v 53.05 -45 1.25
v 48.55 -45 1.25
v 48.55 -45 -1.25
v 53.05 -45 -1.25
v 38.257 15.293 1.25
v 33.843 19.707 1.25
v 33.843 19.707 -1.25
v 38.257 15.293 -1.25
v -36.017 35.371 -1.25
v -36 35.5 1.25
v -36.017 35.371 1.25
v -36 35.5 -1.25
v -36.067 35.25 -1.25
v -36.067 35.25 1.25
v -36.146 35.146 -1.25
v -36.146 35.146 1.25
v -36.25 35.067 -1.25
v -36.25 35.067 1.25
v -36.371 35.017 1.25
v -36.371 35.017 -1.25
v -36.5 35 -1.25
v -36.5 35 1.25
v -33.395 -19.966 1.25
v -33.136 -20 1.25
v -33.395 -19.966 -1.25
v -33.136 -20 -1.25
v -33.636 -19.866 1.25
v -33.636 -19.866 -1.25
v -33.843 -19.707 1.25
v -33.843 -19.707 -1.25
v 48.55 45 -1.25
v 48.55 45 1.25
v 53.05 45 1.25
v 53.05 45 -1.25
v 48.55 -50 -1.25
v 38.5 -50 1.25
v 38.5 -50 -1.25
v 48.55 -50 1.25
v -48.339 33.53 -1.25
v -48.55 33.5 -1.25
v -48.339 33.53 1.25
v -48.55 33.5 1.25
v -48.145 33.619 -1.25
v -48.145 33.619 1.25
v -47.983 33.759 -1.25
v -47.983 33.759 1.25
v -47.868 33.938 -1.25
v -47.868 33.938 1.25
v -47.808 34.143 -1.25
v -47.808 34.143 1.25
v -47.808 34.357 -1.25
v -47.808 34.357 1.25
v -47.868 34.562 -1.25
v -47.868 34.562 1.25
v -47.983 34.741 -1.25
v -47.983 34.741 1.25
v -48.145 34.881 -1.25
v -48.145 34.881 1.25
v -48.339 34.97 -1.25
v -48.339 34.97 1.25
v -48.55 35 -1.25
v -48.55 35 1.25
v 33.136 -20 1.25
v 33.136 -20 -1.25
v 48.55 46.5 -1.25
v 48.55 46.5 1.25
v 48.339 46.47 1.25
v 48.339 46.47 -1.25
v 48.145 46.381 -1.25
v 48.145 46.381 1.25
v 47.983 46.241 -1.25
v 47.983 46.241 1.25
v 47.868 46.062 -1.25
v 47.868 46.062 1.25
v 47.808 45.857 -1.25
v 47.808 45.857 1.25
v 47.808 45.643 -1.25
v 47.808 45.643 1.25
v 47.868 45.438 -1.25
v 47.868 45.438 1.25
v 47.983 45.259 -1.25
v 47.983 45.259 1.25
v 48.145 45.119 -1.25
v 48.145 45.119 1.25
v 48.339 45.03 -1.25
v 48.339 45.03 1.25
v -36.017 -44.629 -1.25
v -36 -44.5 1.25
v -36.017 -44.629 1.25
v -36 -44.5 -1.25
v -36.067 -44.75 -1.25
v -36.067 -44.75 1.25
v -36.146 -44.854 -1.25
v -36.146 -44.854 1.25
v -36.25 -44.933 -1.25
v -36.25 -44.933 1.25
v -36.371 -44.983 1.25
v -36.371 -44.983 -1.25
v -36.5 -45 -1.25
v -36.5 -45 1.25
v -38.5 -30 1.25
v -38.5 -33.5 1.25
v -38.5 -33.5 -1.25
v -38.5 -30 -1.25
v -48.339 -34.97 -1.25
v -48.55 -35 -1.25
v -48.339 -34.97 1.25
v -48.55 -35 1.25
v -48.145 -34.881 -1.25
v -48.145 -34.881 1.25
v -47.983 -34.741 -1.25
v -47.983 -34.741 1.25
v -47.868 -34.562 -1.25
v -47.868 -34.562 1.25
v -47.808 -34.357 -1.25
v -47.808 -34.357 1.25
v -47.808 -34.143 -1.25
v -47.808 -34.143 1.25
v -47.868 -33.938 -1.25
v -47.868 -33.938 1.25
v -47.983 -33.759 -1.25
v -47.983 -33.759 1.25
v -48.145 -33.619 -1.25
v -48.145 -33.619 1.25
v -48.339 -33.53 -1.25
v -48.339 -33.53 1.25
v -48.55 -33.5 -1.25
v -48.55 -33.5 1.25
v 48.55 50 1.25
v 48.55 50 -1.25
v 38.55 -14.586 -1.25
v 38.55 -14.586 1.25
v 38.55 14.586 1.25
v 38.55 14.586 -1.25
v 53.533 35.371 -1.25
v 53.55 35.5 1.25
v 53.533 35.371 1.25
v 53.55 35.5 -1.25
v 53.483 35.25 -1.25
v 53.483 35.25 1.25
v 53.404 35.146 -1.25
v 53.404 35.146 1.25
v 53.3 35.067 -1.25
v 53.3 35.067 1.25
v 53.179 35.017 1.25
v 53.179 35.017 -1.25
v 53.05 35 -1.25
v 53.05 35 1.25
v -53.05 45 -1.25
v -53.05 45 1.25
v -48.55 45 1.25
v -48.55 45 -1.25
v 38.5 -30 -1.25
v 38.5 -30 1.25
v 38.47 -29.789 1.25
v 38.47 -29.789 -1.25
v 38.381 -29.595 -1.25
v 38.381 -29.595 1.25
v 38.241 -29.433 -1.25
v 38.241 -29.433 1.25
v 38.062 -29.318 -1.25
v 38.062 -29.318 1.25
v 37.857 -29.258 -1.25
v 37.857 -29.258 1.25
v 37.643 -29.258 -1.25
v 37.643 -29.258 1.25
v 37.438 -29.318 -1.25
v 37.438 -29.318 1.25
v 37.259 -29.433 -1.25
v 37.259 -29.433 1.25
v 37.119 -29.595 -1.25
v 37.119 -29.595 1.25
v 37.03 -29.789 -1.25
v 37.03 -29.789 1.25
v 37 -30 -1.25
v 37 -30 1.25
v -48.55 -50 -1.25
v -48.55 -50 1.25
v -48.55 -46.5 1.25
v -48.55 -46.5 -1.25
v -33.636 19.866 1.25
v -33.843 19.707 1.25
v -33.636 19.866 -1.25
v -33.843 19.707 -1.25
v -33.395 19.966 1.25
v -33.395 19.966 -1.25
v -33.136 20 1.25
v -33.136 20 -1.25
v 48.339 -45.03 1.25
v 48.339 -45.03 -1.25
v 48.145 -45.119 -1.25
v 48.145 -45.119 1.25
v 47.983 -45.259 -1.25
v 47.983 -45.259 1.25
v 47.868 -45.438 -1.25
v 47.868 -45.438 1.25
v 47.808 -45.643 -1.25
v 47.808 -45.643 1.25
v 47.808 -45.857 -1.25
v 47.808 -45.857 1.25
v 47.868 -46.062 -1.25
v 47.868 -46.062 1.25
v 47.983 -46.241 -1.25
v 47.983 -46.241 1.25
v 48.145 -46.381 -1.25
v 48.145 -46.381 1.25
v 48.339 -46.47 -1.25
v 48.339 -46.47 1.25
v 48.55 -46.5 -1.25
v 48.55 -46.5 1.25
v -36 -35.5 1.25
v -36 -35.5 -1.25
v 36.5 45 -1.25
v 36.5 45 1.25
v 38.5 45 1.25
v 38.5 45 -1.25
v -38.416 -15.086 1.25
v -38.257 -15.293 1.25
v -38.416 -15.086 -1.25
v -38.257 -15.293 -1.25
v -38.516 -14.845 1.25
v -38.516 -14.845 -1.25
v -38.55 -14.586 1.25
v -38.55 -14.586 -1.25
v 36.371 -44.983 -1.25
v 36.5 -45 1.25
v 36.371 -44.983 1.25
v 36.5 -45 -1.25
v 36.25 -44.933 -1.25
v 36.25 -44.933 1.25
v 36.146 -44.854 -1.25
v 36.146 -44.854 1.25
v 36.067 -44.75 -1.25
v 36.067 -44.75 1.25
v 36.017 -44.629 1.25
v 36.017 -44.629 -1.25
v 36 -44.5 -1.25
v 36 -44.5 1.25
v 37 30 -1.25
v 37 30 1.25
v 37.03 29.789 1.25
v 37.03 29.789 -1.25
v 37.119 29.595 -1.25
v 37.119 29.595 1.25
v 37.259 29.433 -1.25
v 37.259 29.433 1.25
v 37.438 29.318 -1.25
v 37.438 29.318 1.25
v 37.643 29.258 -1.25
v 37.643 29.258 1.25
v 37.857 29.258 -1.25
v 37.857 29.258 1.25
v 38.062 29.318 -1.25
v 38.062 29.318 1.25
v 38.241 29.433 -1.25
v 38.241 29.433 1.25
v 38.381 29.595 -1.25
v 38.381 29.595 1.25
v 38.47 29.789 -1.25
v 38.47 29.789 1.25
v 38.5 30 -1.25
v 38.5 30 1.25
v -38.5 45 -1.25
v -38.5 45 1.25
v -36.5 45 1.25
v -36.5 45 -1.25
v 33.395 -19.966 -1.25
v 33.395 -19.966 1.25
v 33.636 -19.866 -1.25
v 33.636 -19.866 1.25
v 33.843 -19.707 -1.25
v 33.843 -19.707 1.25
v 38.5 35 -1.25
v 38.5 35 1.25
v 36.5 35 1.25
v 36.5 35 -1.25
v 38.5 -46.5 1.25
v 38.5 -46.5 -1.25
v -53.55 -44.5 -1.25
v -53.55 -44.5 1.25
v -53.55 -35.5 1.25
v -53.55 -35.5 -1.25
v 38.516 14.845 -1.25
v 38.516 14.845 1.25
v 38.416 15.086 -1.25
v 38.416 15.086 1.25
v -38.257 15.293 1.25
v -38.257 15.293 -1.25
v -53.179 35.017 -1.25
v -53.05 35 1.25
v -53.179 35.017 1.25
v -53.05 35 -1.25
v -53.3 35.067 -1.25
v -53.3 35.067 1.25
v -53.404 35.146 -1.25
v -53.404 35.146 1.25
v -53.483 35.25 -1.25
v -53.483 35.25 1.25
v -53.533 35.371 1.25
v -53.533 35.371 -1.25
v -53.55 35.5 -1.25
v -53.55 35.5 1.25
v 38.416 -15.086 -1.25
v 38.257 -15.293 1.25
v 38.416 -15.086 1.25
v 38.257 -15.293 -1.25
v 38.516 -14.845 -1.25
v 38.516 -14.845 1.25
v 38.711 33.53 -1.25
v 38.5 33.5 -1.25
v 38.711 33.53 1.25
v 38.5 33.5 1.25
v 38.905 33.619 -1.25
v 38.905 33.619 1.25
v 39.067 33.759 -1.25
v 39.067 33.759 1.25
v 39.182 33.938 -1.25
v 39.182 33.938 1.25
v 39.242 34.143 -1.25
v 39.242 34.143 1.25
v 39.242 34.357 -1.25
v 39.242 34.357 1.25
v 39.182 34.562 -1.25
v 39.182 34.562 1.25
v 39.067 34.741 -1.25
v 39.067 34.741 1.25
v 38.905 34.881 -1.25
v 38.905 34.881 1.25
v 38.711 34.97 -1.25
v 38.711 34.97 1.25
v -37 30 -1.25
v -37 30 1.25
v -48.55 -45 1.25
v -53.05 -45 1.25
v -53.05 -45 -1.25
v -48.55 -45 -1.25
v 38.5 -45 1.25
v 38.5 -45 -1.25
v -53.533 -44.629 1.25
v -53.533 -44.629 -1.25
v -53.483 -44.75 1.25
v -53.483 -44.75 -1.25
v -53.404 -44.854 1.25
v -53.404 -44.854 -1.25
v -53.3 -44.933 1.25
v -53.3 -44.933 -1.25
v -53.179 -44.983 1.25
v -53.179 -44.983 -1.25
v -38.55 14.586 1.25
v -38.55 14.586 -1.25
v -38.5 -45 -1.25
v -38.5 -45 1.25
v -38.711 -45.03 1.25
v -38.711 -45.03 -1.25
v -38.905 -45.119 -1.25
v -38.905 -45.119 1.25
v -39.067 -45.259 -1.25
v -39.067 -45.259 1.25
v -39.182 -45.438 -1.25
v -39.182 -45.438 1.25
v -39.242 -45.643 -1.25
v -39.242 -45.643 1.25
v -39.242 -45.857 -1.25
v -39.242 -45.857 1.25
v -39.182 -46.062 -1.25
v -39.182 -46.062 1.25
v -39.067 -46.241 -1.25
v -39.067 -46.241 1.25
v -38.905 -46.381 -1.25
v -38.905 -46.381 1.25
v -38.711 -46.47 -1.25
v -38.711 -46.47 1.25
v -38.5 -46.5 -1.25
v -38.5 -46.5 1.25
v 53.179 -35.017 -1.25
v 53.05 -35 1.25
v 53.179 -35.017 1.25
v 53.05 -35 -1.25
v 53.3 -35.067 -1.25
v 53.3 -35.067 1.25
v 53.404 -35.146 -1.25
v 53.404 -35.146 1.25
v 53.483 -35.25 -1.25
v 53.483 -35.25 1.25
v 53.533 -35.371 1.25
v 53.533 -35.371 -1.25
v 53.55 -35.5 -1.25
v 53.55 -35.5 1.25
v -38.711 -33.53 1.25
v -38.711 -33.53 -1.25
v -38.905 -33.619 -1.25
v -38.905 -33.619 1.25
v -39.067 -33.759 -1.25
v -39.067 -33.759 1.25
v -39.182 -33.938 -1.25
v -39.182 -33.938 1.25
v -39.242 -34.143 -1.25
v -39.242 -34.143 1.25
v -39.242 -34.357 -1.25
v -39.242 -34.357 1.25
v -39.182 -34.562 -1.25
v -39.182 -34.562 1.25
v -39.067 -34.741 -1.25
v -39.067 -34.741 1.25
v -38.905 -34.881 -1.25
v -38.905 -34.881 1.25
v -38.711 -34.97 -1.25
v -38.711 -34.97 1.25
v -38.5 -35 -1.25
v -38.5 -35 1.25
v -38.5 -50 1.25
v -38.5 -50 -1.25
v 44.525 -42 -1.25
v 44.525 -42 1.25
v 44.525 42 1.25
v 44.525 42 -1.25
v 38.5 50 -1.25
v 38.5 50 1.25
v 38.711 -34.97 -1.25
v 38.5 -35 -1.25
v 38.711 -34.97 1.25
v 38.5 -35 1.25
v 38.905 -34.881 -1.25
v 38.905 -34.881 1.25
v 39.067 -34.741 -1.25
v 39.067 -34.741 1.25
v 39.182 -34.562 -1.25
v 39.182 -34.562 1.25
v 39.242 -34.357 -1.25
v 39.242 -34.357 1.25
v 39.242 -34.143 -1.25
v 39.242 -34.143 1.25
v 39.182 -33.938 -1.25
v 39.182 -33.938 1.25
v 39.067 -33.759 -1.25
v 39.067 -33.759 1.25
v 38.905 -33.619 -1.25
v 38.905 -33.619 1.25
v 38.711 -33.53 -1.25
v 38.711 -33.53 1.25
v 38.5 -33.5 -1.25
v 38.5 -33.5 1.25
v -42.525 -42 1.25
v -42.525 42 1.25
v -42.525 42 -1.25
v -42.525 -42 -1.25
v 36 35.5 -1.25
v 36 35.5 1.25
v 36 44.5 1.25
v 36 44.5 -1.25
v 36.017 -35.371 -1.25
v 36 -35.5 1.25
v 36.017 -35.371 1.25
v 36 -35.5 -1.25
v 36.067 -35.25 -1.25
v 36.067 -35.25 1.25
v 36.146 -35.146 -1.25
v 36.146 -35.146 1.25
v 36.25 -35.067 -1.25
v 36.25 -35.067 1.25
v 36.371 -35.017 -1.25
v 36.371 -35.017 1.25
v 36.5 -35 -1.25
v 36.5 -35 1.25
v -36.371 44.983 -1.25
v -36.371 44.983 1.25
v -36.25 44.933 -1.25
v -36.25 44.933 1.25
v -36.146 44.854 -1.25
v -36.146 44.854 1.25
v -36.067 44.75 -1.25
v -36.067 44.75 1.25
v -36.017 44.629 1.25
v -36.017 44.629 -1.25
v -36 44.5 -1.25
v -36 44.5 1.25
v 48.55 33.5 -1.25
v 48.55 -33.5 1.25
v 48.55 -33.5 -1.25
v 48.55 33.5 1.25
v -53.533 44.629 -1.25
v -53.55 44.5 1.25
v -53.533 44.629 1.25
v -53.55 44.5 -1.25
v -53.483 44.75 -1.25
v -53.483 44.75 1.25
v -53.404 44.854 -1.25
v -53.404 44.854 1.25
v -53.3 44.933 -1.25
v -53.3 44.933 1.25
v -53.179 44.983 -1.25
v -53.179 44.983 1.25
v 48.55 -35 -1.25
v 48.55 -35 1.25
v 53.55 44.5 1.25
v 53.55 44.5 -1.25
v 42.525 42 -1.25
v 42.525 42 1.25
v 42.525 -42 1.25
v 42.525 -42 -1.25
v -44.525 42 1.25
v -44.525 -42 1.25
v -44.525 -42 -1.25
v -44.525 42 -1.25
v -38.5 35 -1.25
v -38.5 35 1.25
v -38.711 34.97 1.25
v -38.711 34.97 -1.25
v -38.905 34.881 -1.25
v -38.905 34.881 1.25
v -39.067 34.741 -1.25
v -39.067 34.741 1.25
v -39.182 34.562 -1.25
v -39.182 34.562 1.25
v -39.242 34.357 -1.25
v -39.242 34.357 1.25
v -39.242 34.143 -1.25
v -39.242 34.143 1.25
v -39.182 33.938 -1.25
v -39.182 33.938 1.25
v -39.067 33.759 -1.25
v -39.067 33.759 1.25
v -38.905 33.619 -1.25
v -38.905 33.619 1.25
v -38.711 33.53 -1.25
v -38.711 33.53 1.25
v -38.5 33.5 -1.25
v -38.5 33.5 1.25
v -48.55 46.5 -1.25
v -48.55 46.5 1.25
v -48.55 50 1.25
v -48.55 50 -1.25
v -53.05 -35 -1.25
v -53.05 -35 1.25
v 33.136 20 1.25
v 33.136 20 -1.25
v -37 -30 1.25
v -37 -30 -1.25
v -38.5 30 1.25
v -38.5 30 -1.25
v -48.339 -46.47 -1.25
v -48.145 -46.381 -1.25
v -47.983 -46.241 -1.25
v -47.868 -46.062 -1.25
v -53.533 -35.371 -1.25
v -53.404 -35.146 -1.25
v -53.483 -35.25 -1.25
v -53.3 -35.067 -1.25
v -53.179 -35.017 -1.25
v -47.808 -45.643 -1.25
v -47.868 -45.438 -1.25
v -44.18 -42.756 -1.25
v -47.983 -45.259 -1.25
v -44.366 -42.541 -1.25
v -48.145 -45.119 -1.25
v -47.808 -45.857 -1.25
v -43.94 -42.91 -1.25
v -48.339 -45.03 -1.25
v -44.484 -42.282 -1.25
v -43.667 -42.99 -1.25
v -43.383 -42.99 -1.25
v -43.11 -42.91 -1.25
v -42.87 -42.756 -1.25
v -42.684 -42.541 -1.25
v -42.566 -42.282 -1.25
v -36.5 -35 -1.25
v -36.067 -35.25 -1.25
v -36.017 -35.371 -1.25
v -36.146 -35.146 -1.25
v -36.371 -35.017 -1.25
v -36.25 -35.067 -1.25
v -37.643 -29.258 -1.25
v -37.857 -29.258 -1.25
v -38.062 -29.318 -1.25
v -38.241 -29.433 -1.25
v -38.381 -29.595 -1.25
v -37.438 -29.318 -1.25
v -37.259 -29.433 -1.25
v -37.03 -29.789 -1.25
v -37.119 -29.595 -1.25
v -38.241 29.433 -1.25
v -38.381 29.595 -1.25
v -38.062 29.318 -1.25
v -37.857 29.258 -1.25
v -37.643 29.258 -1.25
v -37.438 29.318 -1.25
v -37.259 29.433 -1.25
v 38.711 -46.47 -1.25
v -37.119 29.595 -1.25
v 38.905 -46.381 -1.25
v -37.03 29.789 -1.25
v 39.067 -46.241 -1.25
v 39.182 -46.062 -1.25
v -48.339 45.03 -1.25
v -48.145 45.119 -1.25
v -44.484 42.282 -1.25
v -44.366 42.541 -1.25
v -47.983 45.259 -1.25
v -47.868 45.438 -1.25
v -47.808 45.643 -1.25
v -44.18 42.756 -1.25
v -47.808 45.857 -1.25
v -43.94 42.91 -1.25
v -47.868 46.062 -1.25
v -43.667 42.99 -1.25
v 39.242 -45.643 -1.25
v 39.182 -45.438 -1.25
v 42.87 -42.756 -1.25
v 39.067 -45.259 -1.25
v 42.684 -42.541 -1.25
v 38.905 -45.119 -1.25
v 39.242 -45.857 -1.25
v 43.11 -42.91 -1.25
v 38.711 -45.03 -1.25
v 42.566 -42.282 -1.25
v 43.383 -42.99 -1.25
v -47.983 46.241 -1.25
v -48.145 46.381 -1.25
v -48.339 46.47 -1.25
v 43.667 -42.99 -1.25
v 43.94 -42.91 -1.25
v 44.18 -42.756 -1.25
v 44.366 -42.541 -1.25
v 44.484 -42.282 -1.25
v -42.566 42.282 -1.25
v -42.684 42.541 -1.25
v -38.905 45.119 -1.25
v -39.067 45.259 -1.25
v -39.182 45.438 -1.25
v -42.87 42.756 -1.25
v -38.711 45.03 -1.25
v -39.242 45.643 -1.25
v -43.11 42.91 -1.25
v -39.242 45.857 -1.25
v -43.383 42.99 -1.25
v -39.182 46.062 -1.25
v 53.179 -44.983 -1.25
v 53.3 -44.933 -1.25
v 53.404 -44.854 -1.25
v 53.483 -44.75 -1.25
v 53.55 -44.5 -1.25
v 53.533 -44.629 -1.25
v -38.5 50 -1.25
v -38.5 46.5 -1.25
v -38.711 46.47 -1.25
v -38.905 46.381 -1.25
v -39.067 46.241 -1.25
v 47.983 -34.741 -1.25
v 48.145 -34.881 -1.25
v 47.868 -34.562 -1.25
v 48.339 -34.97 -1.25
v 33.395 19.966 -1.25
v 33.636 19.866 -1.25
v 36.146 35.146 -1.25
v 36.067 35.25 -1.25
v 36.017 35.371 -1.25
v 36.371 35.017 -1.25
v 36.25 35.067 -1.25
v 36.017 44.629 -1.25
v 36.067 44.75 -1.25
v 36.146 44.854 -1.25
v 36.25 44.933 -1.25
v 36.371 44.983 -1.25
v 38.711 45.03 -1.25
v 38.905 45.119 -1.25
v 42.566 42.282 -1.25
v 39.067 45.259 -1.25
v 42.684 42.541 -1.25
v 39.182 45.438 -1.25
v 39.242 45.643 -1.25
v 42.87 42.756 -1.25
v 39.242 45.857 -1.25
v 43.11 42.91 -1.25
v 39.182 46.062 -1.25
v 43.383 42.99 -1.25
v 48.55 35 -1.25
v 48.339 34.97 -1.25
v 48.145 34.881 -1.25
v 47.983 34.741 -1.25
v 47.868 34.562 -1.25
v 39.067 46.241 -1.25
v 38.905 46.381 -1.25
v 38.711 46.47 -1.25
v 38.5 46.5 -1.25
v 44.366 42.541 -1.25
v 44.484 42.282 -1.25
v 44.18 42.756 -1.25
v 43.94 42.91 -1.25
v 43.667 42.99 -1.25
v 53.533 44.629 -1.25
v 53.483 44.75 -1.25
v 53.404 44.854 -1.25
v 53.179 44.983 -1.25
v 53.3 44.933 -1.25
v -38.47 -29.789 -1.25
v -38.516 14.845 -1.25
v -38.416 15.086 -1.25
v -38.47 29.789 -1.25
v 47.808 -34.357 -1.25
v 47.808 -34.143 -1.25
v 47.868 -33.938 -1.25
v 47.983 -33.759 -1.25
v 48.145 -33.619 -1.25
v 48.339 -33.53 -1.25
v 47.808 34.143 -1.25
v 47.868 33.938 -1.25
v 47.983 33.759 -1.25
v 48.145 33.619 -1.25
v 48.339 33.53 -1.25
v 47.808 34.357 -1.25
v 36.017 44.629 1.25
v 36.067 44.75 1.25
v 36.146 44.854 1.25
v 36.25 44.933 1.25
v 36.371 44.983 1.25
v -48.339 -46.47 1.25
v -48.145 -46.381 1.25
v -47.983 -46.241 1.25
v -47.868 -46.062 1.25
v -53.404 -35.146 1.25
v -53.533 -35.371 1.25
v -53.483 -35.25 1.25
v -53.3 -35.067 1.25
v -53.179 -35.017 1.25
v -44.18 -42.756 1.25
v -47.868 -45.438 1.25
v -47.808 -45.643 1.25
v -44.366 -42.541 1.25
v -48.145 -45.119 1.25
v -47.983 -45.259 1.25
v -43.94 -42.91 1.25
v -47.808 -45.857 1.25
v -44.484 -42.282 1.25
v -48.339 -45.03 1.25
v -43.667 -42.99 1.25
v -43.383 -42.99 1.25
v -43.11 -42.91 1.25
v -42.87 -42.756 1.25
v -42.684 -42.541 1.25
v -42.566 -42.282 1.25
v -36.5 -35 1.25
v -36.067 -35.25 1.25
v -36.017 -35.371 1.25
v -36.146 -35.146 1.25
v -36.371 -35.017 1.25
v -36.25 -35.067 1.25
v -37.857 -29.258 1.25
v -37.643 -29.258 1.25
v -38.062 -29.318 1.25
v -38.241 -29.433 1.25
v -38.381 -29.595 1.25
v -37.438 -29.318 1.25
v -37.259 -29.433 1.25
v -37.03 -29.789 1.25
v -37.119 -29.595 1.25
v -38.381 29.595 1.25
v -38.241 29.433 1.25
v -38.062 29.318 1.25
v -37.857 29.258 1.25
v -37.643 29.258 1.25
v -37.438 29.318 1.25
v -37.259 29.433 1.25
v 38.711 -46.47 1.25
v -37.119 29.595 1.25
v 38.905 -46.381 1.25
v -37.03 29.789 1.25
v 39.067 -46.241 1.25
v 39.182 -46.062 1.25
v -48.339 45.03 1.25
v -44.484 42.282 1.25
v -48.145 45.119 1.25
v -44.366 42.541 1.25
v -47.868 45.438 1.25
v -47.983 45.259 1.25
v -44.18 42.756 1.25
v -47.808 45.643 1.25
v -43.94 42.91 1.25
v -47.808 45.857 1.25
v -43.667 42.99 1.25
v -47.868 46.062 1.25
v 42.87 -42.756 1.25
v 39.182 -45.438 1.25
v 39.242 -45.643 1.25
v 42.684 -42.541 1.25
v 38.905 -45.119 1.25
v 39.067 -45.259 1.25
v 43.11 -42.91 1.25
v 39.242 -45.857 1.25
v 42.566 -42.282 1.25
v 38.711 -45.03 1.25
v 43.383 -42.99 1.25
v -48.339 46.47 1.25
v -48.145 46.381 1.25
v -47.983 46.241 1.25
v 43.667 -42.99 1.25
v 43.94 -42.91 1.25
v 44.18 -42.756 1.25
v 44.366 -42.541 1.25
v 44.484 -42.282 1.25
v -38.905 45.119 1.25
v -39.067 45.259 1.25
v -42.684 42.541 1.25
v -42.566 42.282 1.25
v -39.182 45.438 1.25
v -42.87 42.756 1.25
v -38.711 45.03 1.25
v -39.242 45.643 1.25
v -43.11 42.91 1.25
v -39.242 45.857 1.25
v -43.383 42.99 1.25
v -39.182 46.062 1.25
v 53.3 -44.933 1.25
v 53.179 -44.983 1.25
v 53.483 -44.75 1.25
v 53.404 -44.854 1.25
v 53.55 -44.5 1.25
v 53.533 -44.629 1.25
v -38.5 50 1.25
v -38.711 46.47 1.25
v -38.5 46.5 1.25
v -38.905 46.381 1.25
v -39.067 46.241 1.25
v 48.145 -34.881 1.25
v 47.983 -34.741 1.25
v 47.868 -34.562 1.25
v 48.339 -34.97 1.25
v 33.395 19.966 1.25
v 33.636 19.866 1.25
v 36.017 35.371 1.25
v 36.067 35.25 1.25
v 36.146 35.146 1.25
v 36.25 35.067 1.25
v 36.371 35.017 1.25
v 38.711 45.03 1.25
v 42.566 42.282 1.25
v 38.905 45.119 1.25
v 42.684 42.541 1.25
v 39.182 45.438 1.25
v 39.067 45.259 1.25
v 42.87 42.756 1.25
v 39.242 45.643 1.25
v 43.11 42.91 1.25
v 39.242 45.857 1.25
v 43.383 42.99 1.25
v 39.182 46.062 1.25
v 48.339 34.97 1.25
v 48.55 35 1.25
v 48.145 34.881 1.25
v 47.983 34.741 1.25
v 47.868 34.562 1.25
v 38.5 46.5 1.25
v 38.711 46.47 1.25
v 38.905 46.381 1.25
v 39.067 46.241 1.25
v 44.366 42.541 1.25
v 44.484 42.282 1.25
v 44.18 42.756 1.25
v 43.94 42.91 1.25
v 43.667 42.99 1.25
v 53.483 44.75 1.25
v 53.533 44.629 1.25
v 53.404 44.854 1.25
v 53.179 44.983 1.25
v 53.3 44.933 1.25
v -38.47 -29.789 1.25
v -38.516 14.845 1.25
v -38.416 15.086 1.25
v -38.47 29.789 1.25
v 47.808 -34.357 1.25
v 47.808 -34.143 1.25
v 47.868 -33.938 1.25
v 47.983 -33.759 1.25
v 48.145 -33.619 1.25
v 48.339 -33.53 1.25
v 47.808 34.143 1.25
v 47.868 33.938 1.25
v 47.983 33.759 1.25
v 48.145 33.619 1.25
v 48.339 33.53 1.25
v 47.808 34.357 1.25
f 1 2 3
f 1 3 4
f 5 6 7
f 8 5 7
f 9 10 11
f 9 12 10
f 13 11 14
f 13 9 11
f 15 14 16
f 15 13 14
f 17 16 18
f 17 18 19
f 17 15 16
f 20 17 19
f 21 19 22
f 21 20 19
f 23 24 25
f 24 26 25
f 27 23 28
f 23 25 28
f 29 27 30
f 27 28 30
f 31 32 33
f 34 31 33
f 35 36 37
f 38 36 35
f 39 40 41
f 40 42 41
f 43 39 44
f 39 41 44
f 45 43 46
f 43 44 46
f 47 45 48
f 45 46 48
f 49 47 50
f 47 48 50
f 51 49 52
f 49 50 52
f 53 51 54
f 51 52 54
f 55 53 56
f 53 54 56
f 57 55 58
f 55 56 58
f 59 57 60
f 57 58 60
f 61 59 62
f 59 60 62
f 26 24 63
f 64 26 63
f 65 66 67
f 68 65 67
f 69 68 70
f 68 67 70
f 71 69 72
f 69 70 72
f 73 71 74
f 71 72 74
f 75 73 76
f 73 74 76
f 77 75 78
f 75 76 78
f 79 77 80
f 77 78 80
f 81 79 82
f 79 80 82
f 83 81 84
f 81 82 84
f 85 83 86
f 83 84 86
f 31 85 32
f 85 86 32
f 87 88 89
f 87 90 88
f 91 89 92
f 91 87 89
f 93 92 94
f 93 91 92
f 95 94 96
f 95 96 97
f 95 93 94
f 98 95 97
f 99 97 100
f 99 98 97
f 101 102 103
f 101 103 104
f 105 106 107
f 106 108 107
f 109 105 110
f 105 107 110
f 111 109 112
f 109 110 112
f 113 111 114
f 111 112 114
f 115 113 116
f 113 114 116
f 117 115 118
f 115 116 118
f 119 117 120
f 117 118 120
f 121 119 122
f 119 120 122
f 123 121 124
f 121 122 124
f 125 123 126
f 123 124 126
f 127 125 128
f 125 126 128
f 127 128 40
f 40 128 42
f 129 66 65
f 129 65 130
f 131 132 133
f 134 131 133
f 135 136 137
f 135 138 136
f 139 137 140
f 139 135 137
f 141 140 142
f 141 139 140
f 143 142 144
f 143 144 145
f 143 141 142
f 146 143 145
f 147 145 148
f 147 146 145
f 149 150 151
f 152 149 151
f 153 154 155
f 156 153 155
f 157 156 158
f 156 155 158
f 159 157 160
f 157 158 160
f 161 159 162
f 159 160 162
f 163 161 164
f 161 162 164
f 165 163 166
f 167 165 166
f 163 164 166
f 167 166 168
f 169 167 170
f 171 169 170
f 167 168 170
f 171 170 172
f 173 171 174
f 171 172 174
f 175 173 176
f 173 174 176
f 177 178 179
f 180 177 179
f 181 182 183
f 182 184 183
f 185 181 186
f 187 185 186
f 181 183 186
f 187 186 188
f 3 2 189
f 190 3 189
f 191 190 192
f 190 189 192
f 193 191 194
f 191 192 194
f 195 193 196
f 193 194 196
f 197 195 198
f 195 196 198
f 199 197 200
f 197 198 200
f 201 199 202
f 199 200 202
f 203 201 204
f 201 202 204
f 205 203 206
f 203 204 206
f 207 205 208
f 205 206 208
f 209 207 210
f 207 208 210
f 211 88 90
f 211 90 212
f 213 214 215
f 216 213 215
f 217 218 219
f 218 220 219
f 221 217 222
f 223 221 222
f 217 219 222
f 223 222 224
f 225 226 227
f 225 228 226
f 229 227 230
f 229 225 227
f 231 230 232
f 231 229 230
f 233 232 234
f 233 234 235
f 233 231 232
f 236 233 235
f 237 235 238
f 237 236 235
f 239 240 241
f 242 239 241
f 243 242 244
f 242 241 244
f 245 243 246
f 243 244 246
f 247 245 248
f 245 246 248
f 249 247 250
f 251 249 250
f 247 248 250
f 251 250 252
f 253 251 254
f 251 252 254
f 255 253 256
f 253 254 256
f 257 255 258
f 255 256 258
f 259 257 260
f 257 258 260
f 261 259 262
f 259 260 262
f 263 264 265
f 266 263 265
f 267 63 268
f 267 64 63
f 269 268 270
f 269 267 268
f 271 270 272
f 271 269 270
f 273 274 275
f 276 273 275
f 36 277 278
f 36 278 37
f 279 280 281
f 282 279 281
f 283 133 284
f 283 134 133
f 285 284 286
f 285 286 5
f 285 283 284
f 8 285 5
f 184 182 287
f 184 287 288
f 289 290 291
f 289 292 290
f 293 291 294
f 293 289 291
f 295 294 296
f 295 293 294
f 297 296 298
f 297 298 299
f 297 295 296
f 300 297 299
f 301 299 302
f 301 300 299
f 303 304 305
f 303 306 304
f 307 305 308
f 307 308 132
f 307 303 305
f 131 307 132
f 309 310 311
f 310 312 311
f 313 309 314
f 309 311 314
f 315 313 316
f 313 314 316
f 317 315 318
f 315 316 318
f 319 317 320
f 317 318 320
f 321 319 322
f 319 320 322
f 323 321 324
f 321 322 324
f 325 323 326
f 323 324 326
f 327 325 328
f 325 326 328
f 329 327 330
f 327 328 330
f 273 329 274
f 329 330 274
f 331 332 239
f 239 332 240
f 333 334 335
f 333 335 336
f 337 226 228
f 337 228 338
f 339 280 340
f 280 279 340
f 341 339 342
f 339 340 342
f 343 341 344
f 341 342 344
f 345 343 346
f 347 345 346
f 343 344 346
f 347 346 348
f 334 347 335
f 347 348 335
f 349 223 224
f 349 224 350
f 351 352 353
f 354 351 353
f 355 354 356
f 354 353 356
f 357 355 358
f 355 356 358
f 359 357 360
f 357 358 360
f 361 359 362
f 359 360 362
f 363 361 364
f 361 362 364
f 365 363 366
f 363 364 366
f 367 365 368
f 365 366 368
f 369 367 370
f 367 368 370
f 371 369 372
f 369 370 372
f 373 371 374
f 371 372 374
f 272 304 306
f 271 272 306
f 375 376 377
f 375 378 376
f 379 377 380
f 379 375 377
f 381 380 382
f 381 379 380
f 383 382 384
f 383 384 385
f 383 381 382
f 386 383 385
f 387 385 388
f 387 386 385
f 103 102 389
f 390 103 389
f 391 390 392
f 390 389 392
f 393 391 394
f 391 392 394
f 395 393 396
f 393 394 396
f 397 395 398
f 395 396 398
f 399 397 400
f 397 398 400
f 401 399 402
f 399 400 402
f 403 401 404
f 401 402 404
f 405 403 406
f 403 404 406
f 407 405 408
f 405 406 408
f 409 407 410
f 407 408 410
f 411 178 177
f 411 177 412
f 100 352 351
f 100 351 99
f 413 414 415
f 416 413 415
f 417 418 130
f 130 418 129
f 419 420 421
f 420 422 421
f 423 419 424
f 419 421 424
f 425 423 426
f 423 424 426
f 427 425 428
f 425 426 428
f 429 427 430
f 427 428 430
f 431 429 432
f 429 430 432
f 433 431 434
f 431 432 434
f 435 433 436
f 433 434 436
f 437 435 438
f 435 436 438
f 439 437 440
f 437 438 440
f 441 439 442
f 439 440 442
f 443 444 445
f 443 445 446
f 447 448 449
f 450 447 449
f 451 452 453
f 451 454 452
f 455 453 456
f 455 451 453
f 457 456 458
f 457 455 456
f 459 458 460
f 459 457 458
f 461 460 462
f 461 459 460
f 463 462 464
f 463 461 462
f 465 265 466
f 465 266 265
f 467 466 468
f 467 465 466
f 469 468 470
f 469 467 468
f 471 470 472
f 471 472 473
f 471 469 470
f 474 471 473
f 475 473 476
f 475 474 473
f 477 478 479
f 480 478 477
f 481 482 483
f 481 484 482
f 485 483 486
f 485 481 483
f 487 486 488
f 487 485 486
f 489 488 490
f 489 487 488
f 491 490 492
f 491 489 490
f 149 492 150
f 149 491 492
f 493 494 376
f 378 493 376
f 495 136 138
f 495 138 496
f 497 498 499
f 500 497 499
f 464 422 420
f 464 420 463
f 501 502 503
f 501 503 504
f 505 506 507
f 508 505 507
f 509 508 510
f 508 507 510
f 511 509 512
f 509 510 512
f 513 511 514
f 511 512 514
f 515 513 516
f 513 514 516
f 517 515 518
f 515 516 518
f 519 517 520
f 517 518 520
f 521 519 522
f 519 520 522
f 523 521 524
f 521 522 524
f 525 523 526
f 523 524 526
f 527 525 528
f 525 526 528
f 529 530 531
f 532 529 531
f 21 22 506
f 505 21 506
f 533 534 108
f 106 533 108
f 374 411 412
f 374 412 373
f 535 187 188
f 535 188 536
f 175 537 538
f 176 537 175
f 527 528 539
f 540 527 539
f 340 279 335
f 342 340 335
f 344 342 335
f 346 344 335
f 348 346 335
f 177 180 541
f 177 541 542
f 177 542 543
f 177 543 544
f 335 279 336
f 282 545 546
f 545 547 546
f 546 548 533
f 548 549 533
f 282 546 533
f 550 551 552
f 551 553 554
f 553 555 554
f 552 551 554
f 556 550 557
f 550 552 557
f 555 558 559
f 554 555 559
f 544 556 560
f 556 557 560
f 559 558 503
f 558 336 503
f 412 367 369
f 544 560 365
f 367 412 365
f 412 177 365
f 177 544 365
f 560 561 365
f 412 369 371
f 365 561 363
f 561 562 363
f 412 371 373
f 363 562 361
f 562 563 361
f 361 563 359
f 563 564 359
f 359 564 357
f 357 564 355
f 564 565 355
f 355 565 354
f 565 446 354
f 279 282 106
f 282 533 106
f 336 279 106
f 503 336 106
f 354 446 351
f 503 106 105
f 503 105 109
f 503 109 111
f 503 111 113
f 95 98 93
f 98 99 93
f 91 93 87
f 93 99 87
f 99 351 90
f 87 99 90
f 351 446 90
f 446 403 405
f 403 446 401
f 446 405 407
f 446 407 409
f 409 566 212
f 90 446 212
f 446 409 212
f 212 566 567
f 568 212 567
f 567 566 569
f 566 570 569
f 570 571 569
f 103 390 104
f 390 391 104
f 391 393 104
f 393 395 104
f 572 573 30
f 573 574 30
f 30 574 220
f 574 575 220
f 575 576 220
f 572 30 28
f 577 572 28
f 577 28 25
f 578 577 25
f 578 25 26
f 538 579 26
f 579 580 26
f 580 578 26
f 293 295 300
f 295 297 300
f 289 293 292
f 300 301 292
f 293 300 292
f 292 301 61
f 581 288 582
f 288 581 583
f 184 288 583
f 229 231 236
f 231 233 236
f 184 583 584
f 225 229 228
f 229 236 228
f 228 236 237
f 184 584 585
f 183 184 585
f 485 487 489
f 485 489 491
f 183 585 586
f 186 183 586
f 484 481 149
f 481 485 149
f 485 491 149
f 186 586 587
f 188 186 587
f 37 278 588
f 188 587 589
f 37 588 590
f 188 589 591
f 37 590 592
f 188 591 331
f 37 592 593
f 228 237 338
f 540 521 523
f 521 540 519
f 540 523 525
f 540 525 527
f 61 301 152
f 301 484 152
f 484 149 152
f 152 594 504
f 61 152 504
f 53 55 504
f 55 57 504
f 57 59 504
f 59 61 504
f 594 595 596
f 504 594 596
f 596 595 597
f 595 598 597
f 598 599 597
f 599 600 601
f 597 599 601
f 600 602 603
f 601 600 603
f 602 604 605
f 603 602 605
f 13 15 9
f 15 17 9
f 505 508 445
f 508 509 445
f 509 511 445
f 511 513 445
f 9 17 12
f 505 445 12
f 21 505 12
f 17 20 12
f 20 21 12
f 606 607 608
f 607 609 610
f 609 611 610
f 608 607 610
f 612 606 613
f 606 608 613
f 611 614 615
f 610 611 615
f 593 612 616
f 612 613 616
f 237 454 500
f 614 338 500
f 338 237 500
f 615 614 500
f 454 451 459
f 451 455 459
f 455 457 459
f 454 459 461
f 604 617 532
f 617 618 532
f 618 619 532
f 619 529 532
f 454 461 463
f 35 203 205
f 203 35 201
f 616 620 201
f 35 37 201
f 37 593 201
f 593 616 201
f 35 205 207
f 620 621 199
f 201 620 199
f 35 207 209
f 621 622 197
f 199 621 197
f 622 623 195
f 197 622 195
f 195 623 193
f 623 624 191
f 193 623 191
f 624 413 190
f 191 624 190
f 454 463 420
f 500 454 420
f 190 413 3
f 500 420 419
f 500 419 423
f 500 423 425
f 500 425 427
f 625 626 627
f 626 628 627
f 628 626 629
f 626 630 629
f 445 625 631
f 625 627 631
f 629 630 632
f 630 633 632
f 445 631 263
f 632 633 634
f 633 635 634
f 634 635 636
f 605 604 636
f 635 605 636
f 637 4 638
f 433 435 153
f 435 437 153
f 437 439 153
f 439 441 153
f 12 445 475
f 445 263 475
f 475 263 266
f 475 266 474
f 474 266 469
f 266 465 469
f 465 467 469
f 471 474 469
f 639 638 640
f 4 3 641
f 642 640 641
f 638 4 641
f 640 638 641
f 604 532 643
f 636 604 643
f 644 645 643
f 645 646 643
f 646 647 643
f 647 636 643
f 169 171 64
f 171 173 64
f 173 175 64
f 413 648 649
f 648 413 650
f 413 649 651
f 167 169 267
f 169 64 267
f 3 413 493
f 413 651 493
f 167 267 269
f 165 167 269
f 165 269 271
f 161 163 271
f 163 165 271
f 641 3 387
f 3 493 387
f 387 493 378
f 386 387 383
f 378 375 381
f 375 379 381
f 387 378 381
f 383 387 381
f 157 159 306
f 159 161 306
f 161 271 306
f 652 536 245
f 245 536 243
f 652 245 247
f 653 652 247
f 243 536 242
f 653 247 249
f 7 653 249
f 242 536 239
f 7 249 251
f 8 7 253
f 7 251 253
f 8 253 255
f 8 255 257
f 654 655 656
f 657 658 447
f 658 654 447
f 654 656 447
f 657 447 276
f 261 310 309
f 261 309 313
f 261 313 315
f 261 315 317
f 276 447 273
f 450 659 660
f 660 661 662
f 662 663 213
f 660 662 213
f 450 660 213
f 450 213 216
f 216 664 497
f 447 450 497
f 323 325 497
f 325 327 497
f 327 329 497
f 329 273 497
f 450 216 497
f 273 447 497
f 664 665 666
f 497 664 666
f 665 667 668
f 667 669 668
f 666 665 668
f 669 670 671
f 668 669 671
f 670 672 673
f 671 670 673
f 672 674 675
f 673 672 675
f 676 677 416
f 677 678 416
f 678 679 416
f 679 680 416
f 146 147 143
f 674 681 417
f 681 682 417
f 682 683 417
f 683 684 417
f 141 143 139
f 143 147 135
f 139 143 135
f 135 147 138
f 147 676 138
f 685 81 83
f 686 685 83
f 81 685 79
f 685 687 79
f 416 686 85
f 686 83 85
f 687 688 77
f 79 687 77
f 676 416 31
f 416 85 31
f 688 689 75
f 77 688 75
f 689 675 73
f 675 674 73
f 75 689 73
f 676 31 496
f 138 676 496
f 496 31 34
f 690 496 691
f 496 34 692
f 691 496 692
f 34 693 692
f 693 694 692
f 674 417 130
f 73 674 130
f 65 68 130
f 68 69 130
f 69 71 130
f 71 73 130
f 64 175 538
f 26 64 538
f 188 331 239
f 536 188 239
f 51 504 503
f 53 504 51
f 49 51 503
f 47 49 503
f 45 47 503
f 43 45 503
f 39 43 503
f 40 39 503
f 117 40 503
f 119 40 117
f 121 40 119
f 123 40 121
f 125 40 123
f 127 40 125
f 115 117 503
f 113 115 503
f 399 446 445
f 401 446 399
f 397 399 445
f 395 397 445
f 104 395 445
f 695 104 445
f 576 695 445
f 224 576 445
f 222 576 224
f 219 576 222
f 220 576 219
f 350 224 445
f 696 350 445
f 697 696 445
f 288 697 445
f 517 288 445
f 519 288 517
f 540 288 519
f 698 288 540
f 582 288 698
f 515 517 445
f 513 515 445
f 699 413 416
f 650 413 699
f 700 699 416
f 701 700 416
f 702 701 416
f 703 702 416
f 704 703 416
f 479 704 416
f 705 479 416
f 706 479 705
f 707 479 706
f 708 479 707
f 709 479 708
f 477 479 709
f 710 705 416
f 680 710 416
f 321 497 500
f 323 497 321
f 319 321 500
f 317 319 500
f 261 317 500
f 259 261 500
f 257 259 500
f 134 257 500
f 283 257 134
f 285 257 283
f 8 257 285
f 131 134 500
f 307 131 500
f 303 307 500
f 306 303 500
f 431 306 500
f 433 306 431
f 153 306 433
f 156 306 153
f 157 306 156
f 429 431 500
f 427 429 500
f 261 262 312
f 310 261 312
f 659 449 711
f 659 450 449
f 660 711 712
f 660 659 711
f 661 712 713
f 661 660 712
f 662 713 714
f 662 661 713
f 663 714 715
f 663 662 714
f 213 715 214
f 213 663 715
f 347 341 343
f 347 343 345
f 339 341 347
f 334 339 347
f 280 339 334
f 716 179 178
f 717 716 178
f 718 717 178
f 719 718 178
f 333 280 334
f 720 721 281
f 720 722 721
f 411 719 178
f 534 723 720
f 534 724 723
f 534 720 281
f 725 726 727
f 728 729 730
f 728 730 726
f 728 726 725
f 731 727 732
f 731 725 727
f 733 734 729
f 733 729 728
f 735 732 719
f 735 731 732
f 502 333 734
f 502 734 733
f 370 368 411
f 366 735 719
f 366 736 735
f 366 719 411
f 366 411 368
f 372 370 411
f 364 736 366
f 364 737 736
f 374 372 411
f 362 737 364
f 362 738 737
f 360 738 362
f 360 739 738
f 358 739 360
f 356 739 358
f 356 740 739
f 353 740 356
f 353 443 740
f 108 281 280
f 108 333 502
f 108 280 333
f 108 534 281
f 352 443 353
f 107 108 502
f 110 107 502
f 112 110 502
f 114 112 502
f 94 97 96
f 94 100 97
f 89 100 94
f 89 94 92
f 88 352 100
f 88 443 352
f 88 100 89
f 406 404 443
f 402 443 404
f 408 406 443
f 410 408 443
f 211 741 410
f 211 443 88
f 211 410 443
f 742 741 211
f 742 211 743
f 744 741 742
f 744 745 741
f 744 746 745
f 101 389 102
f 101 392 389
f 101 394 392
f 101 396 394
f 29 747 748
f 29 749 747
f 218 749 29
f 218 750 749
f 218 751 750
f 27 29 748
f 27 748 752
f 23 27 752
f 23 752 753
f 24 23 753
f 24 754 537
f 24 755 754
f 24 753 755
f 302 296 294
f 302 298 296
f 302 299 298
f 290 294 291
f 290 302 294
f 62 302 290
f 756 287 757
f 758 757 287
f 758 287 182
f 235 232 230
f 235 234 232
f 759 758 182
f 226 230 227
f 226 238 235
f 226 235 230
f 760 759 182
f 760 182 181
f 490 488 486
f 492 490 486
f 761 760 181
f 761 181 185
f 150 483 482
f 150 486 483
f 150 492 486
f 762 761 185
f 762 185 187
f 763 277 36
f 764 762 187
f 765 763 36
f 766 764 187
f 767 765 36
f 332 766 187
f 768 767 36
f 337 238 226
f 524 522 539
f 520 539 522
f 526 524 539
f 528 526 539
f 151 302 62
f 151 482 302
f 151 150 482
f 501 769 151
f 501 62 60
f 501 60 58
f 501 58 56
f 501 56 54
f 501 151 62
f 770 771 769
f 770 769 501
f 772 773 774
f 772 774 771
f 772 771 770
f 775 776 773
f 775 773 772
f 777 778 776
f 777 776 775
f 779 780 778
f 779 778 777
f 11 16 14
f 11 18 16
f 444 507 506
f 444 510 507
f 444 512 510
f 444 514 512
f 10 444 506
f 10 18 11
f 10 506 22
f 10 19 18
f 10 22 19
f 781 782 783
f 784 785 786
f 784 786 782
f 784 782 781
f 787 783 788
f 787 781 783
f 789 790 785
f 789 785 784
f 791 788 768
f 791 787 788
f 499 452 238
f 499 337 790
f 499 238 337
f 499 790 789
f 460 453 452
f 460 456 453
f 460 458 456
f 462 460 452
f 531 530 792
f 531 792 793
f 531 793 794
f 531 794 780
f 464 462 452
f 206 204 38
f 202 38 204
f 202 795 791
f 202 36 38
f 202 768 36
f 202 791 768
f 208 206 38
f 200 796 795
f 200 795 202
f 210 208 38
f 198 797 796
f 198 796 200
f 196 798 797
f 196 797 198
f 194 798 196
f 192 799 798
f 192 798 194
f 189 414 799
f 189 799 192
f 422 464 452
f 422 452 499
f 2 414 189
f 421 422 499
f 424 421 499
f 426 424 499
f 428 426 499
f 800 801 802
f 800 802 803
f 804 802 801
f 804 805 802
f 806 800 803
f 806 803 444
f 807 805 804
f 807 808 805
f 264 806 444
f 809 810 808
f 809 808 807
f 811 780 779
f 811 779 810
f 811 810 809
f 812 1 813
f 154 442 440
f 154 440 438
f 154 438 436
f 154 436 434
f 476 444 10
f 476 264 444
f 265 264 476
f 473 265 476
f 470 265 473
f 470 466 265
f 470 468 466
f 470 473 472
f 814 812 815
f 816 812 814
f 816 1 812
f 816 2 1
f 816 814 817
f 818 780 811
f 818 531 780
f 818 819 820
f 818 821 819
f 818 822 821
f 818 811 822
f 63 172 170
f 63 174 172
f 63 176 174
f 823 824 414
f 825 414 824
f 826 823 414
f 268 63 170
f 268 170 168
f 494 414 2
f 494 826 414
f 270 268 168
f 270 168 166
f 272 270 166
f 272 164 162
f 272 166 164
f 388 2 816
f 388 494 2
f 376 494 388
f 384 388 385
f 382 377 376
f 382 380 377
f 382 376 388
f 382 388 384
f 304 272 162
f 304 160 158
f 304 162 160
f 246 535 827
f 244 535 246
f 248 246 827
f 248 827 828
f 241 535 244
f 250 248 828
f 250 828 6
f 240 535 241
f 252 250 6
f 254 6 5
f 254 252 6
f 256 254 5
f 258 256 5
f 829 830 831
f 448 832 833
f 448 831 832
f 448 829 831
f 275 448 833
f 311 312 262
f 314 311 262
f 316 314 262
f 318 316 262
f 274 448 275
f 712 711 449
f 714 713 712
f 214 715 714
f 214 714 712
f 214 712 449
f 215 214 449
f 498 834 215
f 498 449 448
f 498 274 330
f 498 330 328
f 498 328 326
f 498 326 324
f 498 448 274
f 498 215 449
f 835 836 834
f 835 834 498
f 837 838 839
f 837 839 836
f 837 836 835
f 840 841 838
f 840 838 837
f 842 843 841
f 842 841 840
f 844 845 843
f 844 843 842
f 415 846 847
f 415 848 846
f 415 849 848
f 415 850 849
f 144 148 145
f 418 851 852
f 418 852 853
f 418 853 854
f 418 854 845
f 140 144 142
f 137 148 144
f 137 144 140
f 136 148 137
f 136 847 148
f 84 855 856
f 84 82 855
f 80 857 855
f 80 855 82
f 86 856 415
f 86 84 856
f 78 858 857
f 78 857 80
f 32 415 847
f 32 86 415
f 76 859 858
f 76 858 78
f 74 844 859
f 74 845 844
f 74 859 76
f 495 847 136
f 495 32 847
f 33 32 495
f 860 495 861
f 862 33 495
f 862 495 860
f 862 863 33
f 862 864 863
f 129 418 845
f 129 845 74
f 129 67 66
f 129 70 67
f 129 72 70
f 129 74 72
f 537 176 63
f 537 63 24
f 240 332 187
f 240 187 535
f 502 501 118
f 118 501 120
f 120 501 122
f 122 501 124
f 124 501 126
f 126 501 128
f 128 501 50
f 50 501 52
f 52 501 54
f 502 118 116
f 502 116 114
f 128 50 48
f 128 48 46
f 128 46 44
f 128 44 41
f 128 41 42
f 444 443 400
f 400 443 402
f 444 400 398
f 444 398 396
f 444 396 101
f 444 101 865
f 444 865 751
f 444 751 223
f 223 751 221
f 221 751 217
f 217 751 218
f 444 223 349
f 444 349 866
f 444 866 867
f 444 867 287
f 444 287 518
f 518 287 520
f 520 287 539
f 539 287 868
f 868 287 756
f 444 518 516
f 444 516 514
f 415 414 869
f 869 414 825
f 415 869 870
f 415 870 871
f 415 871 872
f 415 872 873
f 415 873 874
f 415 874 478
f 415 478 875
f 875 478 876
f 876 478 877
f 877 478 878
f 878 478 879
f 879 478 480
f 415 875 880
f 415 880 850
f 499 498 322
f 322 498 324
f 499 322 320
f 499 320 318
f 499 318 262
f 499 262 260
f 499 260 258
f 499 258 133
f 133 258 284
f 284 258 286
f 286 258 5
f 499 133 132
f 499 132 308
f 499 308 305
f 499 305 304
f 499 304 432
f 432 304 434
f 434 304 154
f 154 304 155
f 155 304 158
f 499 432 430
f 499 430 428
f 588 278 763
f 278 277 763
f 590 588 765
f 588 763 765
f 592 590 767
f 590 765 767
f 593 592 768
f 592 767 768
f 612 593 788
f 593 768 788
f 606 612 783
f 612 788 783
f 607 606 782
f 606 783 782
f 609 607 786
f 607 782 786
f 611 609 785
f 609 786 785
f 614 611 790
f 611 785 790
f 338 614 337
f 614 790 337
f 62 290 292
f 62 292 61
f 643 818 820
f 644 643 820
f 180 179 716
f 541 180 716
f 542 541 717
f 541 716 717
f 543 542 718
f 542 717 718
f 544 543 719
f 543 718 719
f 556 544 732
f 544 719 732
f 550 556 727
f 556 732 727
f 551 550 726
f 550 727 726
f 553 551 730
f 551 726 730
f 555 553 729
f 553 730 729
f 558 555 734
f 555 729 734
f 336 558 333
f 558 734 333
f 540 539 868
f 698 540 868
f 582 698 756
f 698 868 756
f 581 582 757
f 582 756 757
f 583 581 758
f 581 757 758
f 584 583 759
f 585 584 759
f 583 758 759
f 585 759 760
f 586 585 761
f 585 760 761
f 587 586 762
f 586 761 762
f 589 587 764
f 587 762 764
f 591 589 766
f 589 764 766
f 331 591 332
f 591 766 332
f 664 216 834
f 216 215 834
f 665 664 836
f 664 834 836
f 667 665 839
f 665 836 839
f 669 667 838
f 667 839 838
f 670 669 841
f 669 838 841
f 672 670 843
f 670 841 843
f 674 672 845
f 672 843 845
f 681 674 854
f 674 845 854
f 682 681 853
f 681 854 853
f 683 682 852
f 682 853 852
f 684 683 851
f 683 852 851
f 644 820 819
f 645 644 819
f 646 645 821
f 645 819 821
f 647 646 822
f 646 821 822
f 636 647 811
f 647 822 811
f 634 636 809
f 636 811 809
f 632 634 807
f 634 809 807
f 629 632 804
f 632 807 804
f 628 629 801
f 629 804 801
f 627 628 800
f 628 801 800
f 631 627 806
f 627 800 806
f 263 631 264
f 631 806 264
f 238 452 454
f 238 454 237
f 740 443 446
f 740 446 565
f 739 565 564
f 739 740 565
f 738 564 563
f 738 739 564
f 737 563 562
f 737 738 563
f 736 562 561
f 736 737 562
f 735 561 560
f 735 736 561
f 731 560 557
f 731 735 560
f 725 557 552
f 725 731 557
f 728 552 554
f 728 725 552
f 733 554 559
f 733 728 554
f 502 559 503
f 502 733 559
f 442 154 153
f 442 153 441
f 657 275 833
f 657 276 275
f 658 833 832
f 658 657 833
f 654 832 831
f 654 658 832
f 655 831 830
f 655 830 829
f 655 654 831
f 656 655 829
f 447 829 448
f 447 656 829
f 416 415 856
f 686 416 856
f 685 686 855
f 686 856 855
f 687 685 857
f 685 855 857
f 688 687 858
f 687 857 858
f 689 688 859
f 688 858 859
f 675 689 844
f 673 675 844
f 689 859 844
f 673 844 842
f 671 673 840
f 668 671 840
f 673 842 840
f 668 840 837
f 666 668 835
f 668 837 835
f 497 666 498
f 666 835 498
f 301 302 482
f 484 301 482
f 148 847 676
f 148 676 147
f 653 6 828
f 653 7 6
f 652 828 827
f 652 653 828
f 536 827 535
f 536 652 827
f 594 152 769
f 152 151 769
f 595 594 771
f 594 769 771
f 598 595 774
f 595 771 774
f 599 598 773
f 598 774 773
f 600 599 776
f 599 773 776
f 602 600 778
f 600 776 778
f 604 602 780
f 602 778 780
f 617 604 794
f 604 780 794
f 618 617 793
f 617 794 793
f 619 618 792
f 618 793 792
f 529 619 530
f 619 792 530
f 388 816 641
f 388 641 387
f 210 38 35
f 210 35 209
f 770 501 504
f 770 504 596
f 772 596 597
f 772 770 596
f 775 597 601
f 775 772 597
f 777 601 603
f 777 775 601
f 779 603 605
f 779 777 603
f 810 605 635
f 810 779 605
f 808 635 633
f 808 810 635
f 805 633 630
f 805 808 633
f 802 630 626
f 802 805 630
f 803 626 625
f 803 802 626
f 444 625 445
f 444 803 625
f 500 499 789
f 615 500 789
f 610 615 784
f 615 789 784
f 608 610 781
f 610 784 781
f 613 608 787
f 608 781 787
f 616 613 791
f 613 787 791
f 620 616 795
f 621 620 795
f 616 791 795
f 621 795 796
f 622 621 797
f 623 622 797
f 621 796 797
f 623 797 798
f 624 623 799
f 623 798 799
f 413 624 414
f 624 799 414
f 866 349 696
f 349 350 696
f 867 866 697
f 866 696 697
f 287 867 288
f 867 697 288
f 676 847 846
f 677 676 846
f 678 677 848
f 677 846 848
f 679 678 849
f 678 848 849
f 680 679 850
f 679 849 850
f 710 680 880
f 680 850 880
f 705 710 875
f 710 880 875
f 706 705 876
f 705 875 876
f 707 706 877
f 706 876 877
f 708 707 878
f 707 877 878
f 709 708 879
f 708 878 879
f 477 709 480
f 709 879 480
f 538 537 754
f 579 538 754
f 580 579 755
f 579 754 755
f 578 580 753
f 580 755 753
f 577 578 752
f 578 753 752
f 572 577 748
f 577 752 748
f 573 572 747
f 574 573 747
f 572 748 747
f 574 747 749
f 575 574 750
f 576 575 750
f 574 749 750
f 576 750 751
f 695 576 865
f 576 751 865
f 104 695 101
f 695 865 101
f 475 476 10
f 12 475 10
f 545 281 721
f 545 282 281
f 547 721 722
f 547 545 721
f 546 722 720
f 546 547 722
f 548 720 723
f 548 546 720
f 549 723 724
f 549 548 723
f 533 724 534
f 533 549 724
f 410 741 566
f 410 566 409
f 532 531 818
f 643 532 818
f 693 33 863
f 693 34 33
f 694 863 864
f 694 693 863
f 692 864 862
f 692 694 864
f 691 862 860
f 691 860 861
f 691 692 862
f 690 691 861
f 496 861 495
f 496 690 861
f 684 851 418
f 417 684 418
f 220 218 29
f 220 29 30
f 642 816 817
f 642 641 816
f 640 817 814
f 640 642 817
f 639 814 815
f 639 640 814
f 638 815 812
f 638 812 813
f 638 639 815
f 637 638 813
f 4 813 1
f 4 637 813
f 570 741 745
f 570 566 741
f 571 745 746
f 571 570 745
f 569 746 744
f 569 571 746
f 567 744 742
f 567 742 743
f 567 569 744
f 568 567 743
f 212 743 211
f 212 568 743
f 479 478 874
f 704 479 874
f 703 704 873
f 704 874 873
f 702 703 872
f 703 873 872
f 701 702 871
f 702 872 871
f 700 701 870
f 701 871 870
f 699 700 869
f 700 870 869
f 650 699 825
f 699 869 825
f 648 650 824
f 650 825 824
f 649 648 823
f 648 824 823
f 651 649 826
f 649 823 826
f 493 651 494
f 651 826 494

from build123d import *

# Parameters (mm, degrees)
SKETCH_1_W          = 97.1
SKETCH_1_H          = 100
EXTRUDE_1_DEPTH     = 1.25
SKETCH_2_W          = 10
SKETCH_2_H          = 10
EXTRUDE_2_DEPTH     = 2.5
CUT_EXTRUDE_2_DEPTH = 3.5
SKETCH_3_R          = 0.75
CUT_EXTRUDE_1_DEPTH = 3.5
FILLET_1_R          = 0.5
SKETCH_6_W          = 77.1
SKETCH_6_H          = 40
CUT_EXTRUDE_3_DEPTH = 3.5
CHAMFER_1_SIZE      = 5
FILLET_2_R          = 1
CUT_EXTRUDE_4_DEPTH = 3.5


with BuildPart() as part:
    # 草图1 → 凸台-拉伸1 (new body, symmetric)
    with BuildSketch(Plane.XY):
        Rectangle(SKETCH_1_W, SKETCH_1_H)
    extrude(amount=EXTRUDE_1_DEPTH, both=True)

    # 草图2 → 凸台-拉伸2 (add)
    with BuildSketch(Plane.XY.offset(1.25)):
        with Locations((-48.55, -40)):
            Rectangle(SKETCH_2_W, SKETCH_2_H)
        with Locations((-48.55, 40)):
            Rectangle(SKETCH_2_W, SKETCH_2_H)
        with Locations((48.55, -40)):
            Rectangle(SKETCH_2_W, SKETCH_2_H)
        with Locations((48.55, 40)):
            Rectangle(SKETCH_2_W, SKETCH_2_H)
    extrude(amount=-EXTRUDE_2_DEPTH)

    # 草图5 → 切除-拉伸2 (cut, through all)
    with BuildSketch(Plane.XY.offset(1.25)):
        Polygon((-38.5, 50), (-38.5, 45), (-36, 45), (-36, 35), (-38.5, 35), (-38.5, 30), (38.5, 30), (38.5, 35), (36, 35), (36, 45), (38.5, 45), (38.5, 50), align=None)
        Polygon((-38.5, -50), (-38.5, -45), (-36, -45), (-36, -35), (-38.5, -35), (-38.5, -30), (38.5, -30), (38.5, -35), (36, -35), (36, -45), (38.5, -45), (38.5, -50), align=None)
    extrude(amount=-CUT_EXTRUDE_2_DEPTH, mode=Mode.SUBTRACT)

    # 草图3 → 切除-拉伸1 (cut, through all)
    with BuildSketch(Plane.XY.offset(1.25)):
        with Locations((-48.55, 34.25)):
            Circle(SKETCH_3_R)
        with Locations((-48.55, 45.75)):
            Circle(SKETCH_3_R)
        with Locations((-48.55, -34.25)):
            Circle(SKETCH_3_R)
        with Locations((-48.55, -45.75)):
            Circle(SKETCH_3_R)
        with Locations((48.55, -34.25)):
            Circle(SKETCH_3_R)
        with Locations((48.55, -45.75)):
            Circle(SKETCH_3_R)
        with Locations((48.55, 34.25)):
            Circle(SKETCH_3_R)
        with Locations((48.55, 45.75)):
            Circle(SKETCH_3_R)
        with Locations((-38.5, 45.75)):
            Circle(SKETCH_3_R)
        with Locations((-38.5, 34.25)):
            Circle(SKETCH_3_R)
        with Locations((-37.75, 30)):
            Circle(SKETCH_3_R)
        with Locations((-37.75, -30)):
            Circle(SKETCH_3_R)
        with Locations((-38.5, -34.25)):
            Circle(SKETCH_3_R)
        with Locations((-38.5, -45.75)):
            Circle(SKETCH_3_R)
        with Locations((38.5, -45.75)):
            Circle(SKETCH_3_R)
        with Locations((38.5, -34.25)):
            Circle(SKETCH_3_R)
        with Locations((37.75, -30)):
            Circle(SKETCH_3_R)
        with Locations((37.75, 30)):
            Circle(SKETCH_3_R)
        with Locations((38.5, 34.25)):
            Circle(SKETCH_3_R)
        with Locations((38.5, 45.75)):
            Circle(SKETCH_3_R)
    extrude(amount=-CUT_EXTRUDE_1_DEPTH, mode=Mode.SUBTRACT)

    # 圆角1
    fillet_1_edges = [part.edges().sort_by_distance(p)[0] for p in [
        (36, 45, 0),
        (36, 35, 0),
        (-36, 35, 0),
        (-36, 45, 0),
        (-36, -45, 0),
        (-36, -35, 0),
        (36, -35, 0),
        (36, -45, 0),
        (-53.55, -35, 0),
        (-53.55, -45, 0),
        (-53.55, 45, 0),
        (-53.55, 35, 0),
        (53.55, -45, 0),
        (53.55, -35, 0),
        (53.55, 35, 0),
        (53.55, 45, 0),
    ]]
    fillet(fillet_1_edges, radius=FILLET_1_R)

    # 草图6 → 切除-拉伸3 (cut, through all)
    with BuildSketch(Plane.XY.offset(1.25)):
        Rectangle(SKETCH_6_W, SKETCH_6_H)
    extrude(amount=-CUT_EXTRUDE_3_DEPTH, mode=Mode.SUBTRACT)

    # 倒角1
    chamfer_1_edges = [part.edges().sort_by_distance(p)[0] for p in [
        (-38.55, -20, 0),
        (-38.55, 20, 0),
        (38.55, 20, 0),
        (38.55, -20, 0),
    ]]
    chamfer(chamfer_1_edges, length=CHAMFER_1_SIZE)

    # 圆角2
    fillet_2_edges = [part.edges().sort_by_distance(p)[0] for p in [
        (33.55, -20, 0),
        (-33.55, -20, 0),
        (-38.55, 15, 0),
        (-38.55, -15, 0),
        (38.55, 15, 0),
        (38.55, -15, 0),
        (-33.55, 20, 0),
        (33.55, 20, 0),
    ]]
    fillet(fillet_2_edges, radius=FILLET_2_R)

    # 草图7 → 切除-拉伸4 (cut, through all)
    with BuildSketch(Plane.XY.offset(1.25)):
        with BuildLine():
            Line((-44.525, -42), (-44.525, 42))
            ThreePointArc((-44.525, 42), (-43.525, 43), (-42.525, 42))
            Line((-42.525, 42), (-42.525, -42))
            ThreePointArc((-42.525, -42), (-43.525, -43), (-44.525, -42))
        make_face()
        with BuildLine():
            Line((44.525, -42), (44.525, 42))
            ThreePointArc((44.525, 42), (43.525, 43), (42.525, 42))
            Line((42.525, 42), (42.525, -42))
            ThreePointArc((42.525, -42), (43.525, -43), (44.525, -42))
        make_face()
    extrude(amount=-CUT_EXTRUDE_4_DEPTH, mode=Mode.SUBTRACT)


solid = part.part
